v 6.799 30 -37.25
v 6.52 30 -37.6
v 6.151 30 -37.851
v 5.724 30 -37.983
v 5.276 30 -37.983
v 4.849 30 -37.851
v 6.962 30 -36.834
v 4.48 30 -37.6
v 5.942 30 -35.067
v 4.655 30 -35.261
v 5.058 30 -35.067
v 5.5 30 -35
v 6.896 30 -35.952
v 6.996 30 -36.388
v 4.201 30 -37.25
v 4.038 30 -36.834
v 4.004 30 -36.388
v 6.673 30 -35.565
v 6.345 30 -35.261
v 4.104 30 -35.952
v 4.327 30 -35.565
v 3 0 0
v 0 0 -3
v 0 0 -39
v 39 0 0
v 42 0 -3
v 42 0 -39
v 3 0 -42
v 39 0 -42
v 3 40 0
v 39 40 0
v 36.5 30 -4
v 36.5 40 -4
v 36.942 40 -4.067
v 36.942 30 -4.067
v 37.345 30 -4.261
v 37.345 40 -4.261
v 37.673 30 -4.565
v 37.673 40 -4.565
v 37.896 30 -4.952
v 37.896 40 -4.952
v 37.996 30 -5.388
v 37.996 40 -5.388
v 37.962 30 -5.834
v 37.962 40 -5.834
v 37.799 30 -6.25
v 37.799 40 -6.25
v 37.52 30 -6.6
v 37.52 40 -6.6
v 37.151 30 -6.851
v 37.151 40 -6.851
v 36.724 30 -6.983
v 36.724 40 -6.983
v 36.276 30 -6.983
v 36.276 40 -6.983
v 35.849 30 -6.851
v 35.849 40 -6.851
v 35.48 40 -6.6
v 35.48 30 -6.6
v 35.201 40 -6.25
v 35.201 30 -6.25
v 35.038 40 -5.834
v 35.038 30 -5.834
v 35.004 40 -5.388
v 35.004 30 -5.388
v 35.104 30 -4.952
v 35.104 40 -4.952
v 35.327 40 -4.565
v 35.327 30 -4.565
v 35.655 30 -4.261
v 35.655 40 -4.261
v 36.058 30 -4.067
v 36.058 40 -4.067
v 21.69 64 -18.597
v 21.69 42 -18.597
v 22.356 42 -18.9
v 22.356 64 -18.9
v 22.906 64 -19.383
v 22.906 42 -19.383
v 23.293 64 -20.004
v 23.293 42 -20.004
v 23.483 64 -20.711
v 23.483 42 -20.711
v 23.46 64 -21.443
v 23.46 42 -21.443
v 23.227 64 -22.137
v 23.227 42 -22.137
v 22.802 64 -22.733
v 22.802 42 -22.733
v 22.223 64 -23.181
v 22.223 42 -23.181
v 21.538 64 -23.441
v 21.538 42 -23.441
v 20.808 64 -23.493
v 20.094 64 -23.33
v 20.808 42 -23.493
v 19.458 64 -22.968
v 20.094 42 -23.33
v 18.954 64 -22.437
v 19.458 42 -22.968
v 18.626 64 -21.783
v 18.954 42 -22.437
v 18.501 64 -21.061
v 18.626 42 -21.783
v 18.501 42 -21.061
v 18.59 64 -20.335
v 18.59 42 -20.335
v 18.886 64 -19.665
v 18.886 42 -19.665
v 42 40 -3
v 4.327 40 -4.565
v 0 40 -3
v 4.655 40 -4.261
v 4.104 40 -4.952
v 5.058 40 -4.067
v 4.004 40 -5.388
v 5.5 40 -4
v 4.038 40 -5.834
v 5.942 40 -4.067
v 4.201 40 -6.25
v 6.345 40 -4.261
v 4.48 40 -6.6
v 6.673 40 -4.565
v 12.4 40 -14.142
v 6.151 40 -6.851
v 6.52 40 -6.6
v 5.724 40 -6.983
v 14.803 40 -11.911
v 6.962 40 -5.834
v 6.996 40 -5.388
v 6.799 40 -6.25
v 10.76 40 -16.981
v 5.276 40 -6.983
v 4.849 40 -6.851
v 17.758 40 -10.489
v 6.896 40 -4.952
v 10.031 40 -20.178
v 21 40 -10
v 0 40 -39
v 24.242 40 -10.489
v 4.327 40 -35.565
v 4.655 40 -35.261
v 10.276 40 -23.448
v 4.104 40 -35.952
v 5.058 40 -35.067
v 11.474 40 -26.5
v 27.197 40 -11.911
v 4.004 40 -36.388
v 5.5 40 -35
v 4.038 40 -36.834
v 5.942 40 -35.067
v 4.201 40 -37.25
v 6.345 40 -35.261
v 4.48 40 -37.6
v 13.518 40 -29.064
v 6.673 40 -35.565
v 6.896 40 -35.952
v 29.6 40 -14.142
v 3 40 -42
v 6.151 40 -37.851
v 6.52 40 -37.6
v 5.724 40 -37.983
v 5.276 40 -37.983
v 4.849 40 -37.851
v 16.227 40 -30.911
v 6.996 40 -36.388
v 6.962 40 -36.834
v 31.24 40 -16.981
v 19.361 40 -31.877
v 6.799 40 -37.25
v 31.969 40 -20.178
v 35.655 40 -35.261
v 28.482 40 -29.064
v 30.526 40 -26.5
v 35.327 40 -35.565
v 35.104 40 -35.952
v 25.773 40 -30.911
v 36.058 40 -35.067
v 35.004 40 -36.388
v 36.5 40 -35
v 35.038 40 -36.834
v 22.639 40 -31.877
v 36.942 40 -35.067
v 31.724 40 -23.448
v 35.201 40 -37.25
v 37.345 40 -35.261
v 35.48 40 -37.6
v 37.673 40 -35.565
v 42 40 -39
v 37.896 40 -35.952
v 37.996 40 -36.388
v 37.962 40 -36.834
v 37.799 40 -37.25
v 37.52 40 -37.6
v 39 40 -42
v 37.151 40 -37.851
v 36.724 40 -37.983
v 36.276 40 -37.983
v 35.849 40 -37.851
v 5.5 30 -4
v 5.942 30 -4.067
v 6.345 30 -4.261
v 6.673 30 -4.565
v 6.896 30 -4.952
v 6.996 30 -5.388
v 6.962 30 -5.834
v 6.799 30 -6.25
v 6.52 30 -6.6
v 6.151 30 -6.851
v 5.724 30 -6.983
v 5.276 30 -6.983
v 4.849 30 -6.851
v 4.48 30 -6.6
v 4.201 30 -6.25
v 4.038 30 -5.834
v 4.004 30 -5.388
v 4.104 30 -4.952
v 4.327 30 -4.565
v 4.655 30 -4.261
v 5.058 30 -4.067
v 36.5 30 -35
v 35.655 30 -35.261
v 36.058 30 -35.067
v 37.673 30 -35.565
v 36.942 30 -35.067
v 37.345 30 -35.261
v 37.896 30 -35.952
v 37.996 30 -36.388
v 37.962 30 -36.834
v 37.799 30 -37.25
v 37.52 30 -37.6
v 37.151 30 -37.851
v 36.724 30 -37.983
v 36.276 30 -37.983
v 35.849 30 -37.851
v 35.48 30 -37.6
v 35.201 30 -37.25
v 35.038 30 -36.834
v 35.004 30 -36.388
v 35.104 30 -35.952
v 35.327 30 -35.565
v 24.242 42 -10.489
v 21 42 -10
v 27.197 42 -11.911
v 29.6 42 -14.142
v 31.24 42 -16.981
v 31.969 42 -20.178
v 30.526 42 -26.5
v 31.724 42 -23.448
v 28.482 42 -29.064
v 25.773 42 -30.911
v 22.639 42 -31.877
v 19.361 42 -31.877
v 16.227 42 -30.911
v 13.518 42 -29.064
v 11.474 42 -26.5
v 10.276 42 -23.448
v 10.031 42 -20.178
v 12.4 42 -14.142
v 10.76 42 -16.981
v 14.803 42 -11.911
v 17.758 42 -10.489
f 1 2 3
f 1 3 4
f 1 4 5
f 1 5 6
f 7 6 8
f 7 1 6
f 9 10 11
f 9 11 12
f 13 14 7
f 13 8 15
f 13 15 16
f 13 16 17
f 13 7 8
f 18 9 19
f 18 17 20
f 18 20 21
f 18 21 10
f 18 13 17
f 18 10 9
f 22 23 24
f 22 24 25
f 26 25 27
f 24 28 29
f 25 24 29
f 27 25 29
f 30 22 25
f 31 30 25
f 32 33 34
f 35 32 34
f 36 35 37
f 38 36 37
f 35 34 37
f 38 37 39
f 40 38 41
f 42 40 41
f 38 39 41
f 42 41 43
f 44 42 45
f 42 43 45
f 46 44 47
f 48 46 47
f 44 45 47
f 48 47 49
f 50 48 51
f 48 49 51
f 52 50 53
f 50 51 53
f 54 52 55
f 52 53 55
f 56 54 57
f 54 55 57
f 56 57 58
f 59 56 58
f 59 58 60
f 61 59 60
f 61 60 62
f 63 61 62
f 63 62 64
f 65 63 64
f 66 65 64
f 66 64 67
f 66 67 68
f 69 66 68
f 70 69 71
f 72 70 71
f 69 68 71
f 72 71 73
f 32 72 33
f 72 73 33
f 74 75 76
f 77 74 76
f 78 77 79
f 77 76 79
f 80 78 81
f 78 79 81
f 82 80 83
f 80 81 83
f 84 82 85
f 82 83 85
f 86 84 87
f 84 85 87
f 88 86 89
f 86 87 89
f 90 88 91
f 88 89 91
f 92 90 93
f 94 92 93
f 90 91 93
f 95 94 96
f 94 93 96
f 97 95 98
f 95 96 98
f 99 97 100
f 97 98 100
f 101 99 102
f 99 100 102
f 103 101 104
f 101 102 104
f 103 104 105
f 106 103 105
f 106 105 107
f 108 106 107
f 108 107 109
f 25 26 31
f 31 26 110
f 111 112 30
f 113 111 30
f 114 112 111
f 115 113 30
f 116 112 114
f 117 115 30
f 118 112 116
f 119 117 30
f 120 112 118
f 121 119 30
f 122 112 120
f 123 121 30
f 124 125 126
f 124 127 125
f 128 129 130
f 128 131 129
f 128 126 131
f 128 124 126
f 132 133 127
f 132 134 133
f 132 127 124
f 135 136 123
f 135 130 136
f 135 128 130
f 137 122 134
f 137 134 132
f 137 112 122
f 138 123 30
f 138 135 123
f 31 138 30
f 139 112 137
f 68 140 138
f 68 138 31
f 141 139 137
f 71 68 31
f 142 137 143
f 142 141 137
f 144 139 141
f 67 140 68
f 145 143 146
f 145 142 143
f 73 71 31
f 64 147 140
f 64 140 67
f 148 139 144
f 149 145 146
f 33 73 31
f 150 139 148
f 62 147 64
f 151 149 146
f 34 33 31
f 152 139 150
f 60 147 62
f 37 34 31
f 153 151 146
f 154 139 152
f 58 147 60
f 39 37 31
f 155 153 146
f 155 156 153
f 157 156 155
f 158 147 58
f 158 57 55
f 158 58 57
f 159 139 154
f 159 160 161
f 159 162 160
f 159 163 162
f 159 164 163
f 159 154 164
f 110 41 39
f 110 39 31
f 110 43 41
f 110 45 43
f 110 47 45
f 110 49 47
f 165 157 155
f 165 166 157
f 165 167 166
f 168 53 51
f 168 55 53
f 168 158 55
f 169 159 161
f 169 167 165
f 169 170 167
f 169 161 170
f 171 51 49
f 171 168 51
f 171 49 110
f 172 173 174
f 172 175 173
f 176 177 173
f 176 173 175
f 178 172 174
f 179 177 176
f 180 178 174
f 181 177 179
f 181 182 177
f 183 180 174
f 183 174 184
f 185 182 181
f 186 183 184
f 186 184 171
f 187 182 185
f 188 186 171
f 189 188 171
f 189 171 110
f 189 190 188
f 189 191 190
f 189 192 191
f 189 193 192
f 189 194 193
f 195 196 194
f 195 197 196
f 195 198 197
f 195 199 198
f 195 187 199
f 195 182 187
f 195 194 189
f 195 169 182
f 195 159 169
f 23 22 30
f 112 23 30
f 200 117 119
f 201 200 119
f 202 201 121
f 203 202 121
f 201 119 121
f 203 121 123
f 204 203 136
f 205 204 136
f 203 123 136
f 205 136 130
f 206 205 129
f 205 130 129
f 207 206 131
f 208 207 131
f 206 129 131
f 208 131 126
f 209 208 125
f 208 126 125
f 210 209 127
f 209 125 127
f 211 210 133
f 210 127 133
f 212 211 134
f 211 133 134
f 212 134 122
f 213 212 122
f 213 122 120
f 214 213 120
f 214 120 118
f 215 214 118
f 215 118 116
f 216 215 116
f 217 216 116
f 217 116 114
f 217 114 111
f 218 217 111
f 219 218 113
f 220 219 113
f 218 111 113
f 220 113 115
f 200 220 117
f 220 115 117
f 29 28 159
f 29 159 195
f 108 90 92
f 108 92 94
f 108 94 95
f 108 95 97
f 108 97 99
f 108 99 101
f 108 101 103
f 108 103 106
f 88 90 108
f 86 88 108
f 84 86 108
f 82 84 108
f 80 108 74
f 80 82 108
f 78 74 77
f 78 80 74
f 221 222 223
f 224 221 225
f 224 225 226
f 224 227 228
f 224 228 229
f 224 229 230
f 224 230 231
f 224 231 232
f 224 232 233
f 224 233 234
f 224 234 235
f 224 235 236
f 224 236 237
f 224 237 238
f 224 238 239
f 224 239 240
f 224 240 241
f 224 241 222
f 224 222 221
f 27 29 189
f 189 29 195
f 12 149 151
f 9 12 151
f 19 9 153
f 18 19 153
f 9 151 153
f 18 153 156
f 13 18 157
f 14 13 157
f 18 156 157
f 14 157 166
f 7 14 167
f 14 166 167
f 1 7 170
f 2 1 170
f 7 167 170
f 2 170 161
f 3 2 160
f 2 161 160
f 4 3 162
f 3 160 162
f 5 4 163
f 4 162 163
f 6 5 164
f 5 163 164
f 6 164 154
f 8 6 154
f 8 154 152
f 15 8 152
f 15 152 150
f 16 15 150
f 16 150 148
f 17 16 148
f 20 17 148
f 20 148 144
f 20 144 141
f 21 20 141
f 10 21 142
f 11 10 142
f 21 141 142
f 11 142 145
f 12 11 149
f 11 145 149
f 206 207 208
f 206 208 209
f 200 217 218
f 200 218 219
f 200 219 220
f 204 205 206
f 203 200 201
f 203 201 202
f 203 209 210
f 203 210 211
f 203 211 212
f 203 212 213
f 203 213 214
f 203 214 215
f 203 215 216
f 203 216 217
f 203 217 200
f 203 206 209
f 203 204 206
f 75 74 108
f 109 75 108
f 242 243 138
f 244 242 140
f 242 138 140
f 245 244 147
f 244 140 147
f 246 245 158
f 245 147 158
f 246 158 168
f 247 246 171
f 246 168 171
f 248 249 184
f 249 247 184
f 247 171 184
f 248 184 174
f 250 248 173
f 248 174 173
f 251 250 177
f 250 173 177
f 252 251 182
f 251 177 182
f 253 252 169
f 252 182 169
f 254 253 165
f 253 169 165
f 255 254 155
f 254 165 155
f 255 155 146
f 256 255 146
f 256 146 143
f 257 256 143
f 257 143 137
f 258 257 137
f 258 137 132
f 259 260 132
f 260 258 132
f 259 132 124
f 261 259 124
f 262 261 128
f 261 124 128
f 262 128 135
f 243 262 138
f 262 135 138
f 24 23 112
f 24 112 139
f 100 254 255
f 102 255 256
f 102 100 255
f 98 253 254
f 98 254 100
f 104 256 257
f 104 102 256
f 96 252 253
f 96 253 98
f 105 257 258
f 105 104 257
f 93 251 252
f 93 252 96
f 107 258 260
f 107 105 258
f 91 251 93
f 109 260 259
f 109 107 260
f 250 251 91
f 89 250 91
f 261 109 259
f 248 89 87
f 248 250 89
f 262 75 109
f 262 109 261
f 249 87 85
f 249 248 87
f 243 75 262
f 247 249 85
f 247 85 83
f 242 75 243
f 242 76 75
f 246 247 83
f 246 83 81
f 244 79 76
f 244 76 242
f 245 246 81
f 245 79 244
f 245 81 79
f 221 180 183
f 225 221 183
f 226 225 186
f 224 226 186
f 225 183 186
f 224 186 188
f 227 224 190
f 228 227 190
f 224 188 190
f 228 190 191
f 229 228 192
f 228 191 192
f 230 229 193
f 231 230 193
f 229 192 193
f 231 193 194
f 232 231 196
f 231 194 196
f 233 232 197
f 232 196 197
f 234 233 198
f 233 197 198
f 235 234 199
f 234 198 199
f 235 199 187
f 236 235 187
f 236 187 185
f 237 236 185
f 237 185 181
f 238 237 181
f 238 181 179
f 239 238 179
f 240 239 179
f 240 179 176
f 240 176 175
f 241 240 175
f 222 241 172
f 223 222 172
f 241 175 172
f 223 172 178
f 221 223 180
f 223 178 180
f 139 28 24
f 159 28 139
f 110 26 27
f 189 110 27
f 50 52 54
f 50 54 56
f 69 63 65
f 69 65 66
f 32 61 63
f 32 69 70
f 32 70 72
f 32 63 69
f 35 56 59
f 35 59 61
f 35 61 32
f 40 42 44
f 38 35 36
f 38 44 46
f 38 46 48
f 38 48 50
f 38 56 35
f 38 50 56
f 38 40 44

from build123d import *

# Parameters (mm, degrees)
SKETCH1_W               = 42
SKETCH1_H               = 42
BOSS_EXTRUDE1_DEPTH     = 40
CHAMFER1_SIZE           = 3
SKETCH2_R               = 11
BOSS_EXTRUDE2_DEPTH     = 2
SKETCH3_R               = 2.5
BOSS_EXTRUDE3_DEPTH     = 22
CUT_EXTRUDE1_DEPTH      = 88.315519812
CUT_EXTRUDE1_DEPTH_BACK = 22
SKETCH5_R               = 1.5
CUT_EXTRUDE2_DEPTH      = 10


with BuildPart() as part:
    # Sketch1 → Boss-Extrude1 (new body)
    with BuildSketch(Plane(origin=(0, 0, 0), x_dir=(1, 0, 0), z_dir=(0, 1, 0))):
        with Locations((21, 21)):
            Rectangle(SKETCH1_W, SKETCH1_H)
    extrude(amount=BOSS_EXTRUDE1_DEPTH)

    # Chamfer1
    chamfer1_edges = [part.edges().sort_by_distance(p)[0] for p in [
        (0, 20, -42),
        (42, 20, -42),
        (42, 20, 0),
        (0, 20, 0),
    ]]
    chamfer(chamfer1_edges, length=CHAMFER1_SIZE)

    # Sketch2 → Boss-Extrude2 (add)
    with BuildSketch(Plane(origin=(0, 40, 0), x_dir=(1, 0, 0), z_dir=(0, 1, 0))):
        with Locations(Location((21, 21, 0), (0, 0, 270))):
            Circle(SKETCH2_R)
    extrude(amount=BOSS_EXTRUDE2_DEPTH)

    # Sketch3 → Boss-Extrude3 (add)
    with BuildSketch(Plane(origin=(0, 42, 0), x_dir=(1, 0, 0), z_dir=(0, 1, 0))):
        with Locations(Location((21, 21, 0), (0, 0, 270))):
            Circle(SKETCH3_R)
    extrude(amount=BOSS_EXTRUDE3_DEPTH)

    # Sketch4 → Cut-Extrude1 (cut, two sides: drawn at the far end of the back side and taken through both)
    with BuildSketch(Plane(origin=(0, 64, 0), x_dir=(1, 0, 0), z_dir=(0, 1, 0)).offset(-CUT_EXTRUDE1_DEPTH_BACK)):
        Polygon((91.105119446, -7.851665626), (21.689600393, 18.596991199), (18.886199661, 19.665141159), (-50.529319392, 46.113797983), (-103.426633041, -92.717240123), (38.207805797, -146.682703732), align=None)
    extrude(amount=CUT_EXTRUDE1_DEPTH + CUT_EXTRUDE1_DEPTH_BACK, mode=Mode.SUBTRACT)

    # Sketch5 → Cut-Extrude2 (cut)
    with BuildSketch(Plane(origin=(0, 40, 0), x_dir=(1, 0, 0), z_dir=(0, 1, 0))):
        with Locations(Location((36.5, 36.5, 0), (0, 0, 270))):
            Circle(SKETCH5_R)
        with Locations(Location((36.5, 5.5, 0), (0, 0, 270))):
            Circle(SKETCH5_R)
        with Locations(Location((5.5, 5.5, 0), (0, 0, 270))):
            Circle(SKETCH5_R)
        with Locations(Location((5.5, 36.5, 0), (0, 0, 270))):
            Circle(SKETCH5_R)
    extrude(amount=-CUT_EXTRUDE2_DEPTH, mode=Mode.SUBTRACT)


solid = part.part
